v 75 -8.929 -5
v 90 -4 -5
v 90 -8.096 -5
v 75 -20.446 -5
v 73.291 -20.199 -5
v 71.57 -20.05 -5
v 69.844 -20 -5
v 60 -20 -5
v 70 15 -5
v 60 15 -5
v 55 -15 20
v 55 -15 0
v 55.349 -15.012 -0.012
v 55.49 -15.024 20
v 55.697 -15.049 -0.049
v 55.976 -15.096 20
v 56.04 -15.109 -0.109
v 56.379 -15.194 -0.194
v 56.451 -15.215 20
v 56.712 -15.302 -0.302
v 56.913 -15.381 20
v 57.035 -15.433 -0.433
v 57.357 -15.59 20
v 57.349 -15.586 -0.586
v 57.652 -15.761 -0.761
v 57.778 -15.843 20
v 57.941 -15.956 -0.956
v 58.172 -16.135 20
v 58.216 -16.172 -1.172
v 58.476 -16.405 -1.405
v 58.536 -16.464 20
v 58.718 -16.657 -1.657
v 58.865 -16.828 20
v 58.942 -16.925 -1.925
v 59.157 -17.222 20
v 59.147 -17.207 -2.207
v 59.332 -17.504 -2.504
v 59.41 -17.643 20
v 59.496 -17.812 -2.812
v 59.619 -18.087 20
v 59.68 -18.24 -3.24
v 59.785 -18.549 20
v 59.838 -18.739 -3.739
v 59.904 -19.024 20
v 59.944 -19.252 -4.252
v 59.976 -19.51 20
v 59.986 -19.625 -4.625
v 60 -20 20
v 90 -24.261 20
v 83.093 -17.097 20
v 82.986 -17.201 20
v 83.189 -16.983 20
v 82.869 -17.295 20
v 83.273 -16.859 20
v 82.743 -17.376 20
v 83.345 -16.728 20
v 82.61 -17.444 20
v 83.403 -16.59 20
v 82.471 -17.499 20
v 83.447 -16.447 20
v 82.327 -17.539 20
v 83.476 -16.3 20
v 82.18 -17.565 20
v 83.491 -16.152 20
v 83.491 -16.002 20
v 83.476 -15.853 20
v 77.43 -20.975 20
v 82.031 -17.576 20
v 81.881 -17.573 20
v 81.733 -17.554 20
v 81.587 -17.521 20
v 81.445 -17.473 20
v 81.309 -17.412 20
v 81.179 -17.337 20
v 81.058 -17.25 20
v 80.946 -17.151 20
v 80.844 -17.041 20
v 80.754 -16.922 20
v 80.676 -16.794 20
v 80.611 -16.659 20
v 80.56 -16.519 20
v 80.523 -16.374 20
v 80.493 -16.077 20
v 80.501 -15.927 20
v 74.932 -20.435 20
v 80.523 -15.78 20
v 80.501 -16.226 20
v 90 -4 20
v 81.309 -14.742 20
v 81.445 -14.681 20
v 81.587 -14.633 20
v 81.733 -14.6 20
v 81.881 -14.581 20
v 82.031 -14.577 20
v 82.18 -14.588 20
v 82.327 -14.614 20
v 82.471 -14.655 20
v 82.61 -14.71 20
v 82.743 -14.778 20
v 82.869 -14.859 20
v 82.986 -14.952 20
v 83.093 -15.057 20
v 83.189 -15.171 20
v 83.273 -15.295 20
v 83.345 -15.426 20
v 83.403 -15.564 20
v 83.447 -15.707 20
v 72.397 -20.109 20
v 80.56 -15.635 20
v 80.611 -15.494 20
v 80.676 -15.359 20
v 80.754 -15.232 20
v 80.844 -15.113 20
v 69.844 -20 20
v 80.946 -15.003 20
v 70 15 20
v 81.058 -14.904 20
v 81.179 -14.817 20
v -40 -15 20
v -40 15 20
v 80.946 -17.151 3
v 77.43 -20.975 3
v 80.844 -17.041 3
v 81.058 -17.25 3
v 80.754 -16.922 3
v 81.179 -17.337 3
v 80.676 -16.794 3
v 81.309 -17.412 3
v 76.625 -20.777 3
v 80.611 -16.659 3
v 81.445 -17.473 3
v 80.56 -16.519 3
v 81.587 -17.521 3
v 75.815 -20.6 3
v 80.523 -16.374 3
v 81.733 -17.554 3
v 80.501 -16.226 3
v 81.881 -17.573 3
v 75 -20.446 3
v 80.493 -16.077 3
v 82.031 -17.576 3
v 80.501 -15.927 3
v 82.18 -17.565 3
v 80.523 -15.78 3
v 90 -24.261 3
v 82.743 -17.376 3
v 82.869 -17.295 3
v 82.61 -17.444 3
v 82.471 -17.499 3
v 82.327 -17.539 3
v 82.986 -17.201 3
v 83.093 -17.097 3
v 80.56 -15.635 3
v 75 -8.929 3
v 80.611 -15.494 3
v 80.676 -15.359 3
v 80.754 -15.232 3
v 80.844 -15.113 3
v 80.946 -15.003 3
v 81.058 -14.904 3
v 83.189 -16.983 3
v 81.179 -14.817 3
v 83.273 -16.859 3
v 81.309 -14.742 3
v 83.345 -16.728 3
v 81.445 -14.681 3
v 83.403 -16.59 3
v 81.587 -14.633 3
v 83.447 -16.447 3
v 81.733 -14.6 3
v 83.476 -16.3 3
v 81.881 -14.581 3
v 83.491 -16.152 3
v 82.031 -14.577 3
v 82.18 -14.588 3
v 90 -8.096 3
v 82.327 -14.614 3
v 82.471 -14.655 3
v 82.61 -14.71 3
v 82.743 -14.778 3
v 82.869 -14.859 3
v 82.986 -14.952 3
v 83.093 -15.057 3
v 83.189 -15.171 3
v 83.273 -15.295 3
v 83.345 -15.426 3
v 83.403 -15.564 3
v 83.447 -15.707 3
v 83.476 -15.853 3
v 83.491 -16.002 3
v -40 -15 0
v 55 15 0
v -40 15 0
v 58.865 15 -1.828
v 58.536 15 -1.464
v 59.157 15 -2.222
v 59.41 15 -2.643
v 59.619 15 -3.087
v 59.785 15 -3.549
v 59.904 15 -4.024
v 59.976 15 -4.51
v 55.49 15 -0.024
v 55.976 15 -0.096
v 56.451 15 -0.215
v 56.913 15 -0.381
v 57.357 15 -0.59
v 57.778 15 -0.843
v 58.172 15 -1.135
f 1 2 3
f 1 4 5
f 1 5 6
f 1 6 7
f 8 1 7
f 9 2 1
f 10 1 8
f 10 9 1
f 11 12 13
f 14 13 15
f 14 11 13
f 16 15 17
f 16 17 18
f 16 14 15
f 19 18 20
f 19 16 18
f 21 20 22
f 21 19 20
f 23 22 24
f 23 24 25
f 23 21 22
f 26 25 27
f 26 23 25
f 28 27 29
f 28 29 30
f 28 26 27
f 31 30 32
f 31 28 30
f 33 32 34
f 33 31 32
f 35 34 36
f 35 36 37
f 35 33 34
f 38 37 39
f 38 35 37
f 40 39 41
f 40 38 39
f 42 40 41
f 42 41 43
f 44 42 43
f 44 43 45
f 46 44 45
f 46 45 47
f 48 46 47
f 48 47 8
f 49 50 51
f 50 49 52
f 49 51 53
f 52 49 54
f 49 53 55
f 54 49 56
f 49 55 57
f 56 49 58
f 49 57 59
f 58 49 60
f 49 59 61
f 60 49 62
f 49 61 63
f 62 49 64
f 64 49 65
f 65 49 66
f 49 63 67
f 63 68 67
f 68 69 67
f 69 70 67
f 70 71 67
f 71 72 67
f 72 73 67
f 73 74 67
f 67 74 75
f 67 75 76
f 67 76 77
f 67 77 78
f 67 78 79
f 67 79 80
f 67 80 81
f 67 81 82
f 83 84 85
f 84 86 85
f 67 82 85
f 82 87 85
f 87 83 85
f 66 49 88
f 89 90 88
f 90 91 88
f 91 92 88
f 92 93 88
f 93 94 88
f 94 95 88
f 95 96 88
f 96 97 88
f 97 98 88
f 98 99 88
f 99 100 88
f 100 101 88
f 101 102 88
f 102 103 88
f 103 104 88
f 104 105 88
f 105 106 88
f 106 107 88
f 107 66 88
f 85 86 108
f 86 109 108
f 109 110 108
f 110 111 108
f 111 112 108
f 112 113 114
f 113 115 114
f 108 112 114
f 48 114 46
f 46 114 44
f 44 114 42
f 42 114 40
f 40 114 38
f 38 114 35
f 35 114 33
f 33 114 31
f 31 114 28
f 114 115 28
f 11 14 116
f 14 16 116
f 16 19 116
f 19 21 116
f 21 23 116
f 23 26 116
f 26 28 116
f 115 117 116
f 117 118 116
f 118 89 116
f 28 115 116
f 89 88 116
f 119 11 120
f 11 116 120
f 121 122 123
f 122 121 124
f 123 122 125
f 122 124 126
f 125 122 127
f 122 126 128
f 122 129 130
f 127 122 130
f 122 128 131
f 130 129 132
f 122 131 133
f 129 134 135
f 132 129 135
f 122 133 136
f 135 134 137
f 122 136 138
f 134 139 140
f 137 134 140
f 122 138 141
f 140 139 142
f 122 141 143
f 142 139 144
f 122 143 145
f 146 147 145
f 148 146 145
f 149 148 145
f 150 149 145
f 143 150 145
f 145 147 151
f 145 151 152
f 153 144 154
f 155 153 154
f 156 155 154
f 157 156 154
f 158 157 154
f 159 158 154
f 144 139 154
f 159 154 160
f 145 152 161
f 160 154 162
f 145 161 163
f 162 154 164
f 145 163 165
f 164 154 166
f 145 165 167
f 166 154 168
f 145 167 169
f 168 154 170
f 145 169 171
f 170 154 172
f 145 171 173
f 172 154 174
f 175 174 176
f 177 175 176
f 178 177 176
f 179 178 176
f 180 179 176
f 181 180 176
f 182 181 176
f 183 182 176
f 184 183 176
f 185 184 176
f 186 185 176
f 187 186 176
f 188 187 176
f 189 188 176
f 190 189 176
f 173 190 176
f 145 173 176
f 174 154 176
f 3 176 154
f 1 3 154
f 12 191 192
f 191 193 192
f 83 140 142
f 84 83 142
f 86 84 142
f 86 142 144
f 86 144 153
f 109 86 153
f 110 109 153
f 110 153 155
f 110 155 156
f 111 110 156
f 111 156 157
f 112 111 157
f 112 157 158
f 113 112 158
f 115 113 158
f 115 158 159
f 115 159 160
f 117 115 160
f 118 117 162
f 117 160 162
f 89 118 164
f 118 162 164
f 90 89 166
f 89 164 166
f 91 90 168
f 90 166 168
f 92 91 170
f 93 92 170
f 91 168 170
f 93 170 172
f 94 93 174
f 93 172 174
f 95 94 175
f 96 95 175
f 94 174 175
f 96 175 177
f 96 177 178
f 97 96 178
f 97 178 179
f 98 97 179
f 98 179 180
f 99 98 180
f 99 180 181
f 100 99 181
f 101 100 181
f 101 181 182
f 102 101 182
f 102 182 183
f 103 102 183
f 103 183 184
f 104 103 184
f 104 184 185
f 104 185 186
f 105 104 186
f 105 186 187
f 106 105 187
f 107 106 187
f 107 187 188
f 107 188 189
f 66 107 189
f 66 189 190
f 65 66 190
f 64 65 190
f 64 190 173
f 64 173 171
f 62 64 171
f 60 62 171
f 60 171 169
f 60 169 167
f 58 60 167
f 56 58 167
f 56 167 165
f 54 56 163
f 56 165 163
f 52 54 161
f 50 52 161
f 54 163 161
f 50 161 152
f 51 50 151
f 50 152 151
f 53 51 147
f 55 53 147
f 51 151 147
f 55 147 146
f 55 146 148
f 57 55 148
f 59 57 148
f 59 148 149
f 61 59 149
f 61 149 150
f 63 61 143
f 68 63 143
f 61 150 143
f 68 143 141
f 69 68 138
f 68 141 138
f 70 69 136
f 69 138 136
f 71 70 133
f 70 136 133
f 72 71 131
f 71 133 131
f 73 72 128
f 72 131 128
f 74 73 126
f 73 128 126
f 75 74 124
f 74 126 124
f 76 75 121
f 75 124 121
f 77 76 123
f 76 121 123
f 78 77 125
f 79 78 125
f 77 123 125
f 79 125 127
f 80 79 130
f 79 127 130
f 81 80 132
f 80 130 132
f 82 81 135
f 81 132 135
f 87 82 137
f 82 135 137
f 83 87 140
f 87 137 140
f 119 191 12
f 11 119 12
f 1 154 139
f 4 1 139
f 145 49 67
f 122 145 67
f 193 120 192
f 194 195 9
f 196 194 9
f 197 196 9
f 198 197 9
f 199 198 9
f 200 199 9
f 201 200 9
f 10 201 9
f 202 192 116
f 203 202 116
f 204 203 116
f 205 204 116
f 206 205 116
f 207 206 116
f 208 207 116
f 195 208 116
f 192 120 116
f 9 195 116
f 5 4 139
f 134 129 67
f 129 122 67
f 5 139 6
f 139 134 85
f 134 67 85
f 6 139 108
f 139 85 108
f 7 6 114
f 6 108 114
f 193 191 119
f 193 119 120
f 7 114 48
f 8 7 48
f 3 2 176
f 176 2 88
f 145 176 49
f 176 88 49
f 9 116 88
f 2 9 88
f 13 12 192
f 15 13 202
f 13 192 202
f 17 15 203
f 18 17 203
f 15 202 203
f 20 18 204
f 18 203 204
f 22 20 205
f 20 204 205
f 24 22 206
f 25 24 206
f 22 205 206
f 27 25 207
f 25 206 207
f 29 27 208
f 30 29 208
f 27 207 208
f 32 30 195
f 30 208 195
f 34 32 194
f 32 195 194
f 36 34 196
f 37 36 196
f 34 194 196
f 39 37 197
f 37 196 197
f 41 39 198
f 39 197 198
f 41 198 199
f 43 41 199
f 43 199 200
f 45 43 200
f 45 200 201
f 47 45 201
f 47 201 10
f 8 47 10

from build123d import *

# Parameters (mm, degrees)
SKETCH_1_W          = 100
SKETCH_1_H          = 30
EXTRUDE_1_DEPTH     = 20
EXTRUDE_2_DEPTH     = 25
FILLET_2_R          = 5
CUT_EXTRUDE_START   = -8
CUT_EXTRUDE_1_DEPTH = 8
SKETCH_5_R          = 1.5
CUT_EXTRUDE_2_DEPTH = 95.750127505


with BuildPart() as part:
    # 草图1 → 凸台-拉伸1 (new body)
    with BuildSketch(Plane.XY):
        with Locations((10, 0)):
            Rectangle(SKETCH_1_W, SKETCH_1_H)
    extrude(amount=EXTRUDE_1_DEPTH)

    # 草图2 → 凸台-拉伸2 (add)
    with BuildSketch(Plane.XY.offset(20)):
        with BuildLine():
            Line((60, 15), (70, 15))
            Line((70, 15), (90, -4))
            Line((90, -4), (90, -20))
            Line((90, -20), (90, -24.260805059))
            Line((90, -24.260805059), (77.430397402, -20.975197102))
            ThreePointArc((77.430397402, -20.975197102), (73.668164046, -20.244798043), (69.843512882, -20))
            Line((69.843512882, -20), (60, -20))
            Line((60, -20), (60, 15))
        make_face()
    extrude(amount=-EXTRUDE_2_DEPTH)

    # 圆角2
    fillet_2_edges = [part.edges().sort_by_distance(p)[0] for p in [
        (60, -15, 10),
        (60, 0, 0),
    ]]
    fillet(fillet_2_edges, radius=FILLET_2_R - 0.0001)  # a hair under: the kernel refuses the full size

    # 草图4 → 切除-拉伸1 (cut)
    with BuildSketch(Plane(origin=(0, 0, -5), x_dir=(-1, 0, 0), z_dir=(0, 0, -1)).offset(CUT_EXTRUDE_START)):
        with BuildLine():
            Line((-90, -8.096027328), (-75, -8.928770232))
            Line((-75, -8.928770232), (-75, -20.446478372))
            ThreePointArc((-75, -20.446478372), (-76.220680439, -20.685639459), (-77.430397402, -20.975197102))
            Line((-77.430397402, -20.975197102), (-90, -24.260805059))
            Line((-90, -24.260805059), (-90, -8.096027328))
        make_face()
    extrude(amount=CUT_EXTRUDE_1_DEPTH, mode=Mode.SUBTRACT)

    # 草图5 → 切除-拉伸2 (cut, through all)
    with BuildSketch(Plane(origin=(0, 0, 3), x_dir=(-1, 0, 0), z_dir=(0, 0, -1))):
        with Locations((-81.993244167, -16.076814441)):
            Circle(SKETCH_5_R)
    extrude(amount=-CUT_EXTRUDE_2_DEPTH, mode=Mode.SUBTRACT)


solid = part.part
